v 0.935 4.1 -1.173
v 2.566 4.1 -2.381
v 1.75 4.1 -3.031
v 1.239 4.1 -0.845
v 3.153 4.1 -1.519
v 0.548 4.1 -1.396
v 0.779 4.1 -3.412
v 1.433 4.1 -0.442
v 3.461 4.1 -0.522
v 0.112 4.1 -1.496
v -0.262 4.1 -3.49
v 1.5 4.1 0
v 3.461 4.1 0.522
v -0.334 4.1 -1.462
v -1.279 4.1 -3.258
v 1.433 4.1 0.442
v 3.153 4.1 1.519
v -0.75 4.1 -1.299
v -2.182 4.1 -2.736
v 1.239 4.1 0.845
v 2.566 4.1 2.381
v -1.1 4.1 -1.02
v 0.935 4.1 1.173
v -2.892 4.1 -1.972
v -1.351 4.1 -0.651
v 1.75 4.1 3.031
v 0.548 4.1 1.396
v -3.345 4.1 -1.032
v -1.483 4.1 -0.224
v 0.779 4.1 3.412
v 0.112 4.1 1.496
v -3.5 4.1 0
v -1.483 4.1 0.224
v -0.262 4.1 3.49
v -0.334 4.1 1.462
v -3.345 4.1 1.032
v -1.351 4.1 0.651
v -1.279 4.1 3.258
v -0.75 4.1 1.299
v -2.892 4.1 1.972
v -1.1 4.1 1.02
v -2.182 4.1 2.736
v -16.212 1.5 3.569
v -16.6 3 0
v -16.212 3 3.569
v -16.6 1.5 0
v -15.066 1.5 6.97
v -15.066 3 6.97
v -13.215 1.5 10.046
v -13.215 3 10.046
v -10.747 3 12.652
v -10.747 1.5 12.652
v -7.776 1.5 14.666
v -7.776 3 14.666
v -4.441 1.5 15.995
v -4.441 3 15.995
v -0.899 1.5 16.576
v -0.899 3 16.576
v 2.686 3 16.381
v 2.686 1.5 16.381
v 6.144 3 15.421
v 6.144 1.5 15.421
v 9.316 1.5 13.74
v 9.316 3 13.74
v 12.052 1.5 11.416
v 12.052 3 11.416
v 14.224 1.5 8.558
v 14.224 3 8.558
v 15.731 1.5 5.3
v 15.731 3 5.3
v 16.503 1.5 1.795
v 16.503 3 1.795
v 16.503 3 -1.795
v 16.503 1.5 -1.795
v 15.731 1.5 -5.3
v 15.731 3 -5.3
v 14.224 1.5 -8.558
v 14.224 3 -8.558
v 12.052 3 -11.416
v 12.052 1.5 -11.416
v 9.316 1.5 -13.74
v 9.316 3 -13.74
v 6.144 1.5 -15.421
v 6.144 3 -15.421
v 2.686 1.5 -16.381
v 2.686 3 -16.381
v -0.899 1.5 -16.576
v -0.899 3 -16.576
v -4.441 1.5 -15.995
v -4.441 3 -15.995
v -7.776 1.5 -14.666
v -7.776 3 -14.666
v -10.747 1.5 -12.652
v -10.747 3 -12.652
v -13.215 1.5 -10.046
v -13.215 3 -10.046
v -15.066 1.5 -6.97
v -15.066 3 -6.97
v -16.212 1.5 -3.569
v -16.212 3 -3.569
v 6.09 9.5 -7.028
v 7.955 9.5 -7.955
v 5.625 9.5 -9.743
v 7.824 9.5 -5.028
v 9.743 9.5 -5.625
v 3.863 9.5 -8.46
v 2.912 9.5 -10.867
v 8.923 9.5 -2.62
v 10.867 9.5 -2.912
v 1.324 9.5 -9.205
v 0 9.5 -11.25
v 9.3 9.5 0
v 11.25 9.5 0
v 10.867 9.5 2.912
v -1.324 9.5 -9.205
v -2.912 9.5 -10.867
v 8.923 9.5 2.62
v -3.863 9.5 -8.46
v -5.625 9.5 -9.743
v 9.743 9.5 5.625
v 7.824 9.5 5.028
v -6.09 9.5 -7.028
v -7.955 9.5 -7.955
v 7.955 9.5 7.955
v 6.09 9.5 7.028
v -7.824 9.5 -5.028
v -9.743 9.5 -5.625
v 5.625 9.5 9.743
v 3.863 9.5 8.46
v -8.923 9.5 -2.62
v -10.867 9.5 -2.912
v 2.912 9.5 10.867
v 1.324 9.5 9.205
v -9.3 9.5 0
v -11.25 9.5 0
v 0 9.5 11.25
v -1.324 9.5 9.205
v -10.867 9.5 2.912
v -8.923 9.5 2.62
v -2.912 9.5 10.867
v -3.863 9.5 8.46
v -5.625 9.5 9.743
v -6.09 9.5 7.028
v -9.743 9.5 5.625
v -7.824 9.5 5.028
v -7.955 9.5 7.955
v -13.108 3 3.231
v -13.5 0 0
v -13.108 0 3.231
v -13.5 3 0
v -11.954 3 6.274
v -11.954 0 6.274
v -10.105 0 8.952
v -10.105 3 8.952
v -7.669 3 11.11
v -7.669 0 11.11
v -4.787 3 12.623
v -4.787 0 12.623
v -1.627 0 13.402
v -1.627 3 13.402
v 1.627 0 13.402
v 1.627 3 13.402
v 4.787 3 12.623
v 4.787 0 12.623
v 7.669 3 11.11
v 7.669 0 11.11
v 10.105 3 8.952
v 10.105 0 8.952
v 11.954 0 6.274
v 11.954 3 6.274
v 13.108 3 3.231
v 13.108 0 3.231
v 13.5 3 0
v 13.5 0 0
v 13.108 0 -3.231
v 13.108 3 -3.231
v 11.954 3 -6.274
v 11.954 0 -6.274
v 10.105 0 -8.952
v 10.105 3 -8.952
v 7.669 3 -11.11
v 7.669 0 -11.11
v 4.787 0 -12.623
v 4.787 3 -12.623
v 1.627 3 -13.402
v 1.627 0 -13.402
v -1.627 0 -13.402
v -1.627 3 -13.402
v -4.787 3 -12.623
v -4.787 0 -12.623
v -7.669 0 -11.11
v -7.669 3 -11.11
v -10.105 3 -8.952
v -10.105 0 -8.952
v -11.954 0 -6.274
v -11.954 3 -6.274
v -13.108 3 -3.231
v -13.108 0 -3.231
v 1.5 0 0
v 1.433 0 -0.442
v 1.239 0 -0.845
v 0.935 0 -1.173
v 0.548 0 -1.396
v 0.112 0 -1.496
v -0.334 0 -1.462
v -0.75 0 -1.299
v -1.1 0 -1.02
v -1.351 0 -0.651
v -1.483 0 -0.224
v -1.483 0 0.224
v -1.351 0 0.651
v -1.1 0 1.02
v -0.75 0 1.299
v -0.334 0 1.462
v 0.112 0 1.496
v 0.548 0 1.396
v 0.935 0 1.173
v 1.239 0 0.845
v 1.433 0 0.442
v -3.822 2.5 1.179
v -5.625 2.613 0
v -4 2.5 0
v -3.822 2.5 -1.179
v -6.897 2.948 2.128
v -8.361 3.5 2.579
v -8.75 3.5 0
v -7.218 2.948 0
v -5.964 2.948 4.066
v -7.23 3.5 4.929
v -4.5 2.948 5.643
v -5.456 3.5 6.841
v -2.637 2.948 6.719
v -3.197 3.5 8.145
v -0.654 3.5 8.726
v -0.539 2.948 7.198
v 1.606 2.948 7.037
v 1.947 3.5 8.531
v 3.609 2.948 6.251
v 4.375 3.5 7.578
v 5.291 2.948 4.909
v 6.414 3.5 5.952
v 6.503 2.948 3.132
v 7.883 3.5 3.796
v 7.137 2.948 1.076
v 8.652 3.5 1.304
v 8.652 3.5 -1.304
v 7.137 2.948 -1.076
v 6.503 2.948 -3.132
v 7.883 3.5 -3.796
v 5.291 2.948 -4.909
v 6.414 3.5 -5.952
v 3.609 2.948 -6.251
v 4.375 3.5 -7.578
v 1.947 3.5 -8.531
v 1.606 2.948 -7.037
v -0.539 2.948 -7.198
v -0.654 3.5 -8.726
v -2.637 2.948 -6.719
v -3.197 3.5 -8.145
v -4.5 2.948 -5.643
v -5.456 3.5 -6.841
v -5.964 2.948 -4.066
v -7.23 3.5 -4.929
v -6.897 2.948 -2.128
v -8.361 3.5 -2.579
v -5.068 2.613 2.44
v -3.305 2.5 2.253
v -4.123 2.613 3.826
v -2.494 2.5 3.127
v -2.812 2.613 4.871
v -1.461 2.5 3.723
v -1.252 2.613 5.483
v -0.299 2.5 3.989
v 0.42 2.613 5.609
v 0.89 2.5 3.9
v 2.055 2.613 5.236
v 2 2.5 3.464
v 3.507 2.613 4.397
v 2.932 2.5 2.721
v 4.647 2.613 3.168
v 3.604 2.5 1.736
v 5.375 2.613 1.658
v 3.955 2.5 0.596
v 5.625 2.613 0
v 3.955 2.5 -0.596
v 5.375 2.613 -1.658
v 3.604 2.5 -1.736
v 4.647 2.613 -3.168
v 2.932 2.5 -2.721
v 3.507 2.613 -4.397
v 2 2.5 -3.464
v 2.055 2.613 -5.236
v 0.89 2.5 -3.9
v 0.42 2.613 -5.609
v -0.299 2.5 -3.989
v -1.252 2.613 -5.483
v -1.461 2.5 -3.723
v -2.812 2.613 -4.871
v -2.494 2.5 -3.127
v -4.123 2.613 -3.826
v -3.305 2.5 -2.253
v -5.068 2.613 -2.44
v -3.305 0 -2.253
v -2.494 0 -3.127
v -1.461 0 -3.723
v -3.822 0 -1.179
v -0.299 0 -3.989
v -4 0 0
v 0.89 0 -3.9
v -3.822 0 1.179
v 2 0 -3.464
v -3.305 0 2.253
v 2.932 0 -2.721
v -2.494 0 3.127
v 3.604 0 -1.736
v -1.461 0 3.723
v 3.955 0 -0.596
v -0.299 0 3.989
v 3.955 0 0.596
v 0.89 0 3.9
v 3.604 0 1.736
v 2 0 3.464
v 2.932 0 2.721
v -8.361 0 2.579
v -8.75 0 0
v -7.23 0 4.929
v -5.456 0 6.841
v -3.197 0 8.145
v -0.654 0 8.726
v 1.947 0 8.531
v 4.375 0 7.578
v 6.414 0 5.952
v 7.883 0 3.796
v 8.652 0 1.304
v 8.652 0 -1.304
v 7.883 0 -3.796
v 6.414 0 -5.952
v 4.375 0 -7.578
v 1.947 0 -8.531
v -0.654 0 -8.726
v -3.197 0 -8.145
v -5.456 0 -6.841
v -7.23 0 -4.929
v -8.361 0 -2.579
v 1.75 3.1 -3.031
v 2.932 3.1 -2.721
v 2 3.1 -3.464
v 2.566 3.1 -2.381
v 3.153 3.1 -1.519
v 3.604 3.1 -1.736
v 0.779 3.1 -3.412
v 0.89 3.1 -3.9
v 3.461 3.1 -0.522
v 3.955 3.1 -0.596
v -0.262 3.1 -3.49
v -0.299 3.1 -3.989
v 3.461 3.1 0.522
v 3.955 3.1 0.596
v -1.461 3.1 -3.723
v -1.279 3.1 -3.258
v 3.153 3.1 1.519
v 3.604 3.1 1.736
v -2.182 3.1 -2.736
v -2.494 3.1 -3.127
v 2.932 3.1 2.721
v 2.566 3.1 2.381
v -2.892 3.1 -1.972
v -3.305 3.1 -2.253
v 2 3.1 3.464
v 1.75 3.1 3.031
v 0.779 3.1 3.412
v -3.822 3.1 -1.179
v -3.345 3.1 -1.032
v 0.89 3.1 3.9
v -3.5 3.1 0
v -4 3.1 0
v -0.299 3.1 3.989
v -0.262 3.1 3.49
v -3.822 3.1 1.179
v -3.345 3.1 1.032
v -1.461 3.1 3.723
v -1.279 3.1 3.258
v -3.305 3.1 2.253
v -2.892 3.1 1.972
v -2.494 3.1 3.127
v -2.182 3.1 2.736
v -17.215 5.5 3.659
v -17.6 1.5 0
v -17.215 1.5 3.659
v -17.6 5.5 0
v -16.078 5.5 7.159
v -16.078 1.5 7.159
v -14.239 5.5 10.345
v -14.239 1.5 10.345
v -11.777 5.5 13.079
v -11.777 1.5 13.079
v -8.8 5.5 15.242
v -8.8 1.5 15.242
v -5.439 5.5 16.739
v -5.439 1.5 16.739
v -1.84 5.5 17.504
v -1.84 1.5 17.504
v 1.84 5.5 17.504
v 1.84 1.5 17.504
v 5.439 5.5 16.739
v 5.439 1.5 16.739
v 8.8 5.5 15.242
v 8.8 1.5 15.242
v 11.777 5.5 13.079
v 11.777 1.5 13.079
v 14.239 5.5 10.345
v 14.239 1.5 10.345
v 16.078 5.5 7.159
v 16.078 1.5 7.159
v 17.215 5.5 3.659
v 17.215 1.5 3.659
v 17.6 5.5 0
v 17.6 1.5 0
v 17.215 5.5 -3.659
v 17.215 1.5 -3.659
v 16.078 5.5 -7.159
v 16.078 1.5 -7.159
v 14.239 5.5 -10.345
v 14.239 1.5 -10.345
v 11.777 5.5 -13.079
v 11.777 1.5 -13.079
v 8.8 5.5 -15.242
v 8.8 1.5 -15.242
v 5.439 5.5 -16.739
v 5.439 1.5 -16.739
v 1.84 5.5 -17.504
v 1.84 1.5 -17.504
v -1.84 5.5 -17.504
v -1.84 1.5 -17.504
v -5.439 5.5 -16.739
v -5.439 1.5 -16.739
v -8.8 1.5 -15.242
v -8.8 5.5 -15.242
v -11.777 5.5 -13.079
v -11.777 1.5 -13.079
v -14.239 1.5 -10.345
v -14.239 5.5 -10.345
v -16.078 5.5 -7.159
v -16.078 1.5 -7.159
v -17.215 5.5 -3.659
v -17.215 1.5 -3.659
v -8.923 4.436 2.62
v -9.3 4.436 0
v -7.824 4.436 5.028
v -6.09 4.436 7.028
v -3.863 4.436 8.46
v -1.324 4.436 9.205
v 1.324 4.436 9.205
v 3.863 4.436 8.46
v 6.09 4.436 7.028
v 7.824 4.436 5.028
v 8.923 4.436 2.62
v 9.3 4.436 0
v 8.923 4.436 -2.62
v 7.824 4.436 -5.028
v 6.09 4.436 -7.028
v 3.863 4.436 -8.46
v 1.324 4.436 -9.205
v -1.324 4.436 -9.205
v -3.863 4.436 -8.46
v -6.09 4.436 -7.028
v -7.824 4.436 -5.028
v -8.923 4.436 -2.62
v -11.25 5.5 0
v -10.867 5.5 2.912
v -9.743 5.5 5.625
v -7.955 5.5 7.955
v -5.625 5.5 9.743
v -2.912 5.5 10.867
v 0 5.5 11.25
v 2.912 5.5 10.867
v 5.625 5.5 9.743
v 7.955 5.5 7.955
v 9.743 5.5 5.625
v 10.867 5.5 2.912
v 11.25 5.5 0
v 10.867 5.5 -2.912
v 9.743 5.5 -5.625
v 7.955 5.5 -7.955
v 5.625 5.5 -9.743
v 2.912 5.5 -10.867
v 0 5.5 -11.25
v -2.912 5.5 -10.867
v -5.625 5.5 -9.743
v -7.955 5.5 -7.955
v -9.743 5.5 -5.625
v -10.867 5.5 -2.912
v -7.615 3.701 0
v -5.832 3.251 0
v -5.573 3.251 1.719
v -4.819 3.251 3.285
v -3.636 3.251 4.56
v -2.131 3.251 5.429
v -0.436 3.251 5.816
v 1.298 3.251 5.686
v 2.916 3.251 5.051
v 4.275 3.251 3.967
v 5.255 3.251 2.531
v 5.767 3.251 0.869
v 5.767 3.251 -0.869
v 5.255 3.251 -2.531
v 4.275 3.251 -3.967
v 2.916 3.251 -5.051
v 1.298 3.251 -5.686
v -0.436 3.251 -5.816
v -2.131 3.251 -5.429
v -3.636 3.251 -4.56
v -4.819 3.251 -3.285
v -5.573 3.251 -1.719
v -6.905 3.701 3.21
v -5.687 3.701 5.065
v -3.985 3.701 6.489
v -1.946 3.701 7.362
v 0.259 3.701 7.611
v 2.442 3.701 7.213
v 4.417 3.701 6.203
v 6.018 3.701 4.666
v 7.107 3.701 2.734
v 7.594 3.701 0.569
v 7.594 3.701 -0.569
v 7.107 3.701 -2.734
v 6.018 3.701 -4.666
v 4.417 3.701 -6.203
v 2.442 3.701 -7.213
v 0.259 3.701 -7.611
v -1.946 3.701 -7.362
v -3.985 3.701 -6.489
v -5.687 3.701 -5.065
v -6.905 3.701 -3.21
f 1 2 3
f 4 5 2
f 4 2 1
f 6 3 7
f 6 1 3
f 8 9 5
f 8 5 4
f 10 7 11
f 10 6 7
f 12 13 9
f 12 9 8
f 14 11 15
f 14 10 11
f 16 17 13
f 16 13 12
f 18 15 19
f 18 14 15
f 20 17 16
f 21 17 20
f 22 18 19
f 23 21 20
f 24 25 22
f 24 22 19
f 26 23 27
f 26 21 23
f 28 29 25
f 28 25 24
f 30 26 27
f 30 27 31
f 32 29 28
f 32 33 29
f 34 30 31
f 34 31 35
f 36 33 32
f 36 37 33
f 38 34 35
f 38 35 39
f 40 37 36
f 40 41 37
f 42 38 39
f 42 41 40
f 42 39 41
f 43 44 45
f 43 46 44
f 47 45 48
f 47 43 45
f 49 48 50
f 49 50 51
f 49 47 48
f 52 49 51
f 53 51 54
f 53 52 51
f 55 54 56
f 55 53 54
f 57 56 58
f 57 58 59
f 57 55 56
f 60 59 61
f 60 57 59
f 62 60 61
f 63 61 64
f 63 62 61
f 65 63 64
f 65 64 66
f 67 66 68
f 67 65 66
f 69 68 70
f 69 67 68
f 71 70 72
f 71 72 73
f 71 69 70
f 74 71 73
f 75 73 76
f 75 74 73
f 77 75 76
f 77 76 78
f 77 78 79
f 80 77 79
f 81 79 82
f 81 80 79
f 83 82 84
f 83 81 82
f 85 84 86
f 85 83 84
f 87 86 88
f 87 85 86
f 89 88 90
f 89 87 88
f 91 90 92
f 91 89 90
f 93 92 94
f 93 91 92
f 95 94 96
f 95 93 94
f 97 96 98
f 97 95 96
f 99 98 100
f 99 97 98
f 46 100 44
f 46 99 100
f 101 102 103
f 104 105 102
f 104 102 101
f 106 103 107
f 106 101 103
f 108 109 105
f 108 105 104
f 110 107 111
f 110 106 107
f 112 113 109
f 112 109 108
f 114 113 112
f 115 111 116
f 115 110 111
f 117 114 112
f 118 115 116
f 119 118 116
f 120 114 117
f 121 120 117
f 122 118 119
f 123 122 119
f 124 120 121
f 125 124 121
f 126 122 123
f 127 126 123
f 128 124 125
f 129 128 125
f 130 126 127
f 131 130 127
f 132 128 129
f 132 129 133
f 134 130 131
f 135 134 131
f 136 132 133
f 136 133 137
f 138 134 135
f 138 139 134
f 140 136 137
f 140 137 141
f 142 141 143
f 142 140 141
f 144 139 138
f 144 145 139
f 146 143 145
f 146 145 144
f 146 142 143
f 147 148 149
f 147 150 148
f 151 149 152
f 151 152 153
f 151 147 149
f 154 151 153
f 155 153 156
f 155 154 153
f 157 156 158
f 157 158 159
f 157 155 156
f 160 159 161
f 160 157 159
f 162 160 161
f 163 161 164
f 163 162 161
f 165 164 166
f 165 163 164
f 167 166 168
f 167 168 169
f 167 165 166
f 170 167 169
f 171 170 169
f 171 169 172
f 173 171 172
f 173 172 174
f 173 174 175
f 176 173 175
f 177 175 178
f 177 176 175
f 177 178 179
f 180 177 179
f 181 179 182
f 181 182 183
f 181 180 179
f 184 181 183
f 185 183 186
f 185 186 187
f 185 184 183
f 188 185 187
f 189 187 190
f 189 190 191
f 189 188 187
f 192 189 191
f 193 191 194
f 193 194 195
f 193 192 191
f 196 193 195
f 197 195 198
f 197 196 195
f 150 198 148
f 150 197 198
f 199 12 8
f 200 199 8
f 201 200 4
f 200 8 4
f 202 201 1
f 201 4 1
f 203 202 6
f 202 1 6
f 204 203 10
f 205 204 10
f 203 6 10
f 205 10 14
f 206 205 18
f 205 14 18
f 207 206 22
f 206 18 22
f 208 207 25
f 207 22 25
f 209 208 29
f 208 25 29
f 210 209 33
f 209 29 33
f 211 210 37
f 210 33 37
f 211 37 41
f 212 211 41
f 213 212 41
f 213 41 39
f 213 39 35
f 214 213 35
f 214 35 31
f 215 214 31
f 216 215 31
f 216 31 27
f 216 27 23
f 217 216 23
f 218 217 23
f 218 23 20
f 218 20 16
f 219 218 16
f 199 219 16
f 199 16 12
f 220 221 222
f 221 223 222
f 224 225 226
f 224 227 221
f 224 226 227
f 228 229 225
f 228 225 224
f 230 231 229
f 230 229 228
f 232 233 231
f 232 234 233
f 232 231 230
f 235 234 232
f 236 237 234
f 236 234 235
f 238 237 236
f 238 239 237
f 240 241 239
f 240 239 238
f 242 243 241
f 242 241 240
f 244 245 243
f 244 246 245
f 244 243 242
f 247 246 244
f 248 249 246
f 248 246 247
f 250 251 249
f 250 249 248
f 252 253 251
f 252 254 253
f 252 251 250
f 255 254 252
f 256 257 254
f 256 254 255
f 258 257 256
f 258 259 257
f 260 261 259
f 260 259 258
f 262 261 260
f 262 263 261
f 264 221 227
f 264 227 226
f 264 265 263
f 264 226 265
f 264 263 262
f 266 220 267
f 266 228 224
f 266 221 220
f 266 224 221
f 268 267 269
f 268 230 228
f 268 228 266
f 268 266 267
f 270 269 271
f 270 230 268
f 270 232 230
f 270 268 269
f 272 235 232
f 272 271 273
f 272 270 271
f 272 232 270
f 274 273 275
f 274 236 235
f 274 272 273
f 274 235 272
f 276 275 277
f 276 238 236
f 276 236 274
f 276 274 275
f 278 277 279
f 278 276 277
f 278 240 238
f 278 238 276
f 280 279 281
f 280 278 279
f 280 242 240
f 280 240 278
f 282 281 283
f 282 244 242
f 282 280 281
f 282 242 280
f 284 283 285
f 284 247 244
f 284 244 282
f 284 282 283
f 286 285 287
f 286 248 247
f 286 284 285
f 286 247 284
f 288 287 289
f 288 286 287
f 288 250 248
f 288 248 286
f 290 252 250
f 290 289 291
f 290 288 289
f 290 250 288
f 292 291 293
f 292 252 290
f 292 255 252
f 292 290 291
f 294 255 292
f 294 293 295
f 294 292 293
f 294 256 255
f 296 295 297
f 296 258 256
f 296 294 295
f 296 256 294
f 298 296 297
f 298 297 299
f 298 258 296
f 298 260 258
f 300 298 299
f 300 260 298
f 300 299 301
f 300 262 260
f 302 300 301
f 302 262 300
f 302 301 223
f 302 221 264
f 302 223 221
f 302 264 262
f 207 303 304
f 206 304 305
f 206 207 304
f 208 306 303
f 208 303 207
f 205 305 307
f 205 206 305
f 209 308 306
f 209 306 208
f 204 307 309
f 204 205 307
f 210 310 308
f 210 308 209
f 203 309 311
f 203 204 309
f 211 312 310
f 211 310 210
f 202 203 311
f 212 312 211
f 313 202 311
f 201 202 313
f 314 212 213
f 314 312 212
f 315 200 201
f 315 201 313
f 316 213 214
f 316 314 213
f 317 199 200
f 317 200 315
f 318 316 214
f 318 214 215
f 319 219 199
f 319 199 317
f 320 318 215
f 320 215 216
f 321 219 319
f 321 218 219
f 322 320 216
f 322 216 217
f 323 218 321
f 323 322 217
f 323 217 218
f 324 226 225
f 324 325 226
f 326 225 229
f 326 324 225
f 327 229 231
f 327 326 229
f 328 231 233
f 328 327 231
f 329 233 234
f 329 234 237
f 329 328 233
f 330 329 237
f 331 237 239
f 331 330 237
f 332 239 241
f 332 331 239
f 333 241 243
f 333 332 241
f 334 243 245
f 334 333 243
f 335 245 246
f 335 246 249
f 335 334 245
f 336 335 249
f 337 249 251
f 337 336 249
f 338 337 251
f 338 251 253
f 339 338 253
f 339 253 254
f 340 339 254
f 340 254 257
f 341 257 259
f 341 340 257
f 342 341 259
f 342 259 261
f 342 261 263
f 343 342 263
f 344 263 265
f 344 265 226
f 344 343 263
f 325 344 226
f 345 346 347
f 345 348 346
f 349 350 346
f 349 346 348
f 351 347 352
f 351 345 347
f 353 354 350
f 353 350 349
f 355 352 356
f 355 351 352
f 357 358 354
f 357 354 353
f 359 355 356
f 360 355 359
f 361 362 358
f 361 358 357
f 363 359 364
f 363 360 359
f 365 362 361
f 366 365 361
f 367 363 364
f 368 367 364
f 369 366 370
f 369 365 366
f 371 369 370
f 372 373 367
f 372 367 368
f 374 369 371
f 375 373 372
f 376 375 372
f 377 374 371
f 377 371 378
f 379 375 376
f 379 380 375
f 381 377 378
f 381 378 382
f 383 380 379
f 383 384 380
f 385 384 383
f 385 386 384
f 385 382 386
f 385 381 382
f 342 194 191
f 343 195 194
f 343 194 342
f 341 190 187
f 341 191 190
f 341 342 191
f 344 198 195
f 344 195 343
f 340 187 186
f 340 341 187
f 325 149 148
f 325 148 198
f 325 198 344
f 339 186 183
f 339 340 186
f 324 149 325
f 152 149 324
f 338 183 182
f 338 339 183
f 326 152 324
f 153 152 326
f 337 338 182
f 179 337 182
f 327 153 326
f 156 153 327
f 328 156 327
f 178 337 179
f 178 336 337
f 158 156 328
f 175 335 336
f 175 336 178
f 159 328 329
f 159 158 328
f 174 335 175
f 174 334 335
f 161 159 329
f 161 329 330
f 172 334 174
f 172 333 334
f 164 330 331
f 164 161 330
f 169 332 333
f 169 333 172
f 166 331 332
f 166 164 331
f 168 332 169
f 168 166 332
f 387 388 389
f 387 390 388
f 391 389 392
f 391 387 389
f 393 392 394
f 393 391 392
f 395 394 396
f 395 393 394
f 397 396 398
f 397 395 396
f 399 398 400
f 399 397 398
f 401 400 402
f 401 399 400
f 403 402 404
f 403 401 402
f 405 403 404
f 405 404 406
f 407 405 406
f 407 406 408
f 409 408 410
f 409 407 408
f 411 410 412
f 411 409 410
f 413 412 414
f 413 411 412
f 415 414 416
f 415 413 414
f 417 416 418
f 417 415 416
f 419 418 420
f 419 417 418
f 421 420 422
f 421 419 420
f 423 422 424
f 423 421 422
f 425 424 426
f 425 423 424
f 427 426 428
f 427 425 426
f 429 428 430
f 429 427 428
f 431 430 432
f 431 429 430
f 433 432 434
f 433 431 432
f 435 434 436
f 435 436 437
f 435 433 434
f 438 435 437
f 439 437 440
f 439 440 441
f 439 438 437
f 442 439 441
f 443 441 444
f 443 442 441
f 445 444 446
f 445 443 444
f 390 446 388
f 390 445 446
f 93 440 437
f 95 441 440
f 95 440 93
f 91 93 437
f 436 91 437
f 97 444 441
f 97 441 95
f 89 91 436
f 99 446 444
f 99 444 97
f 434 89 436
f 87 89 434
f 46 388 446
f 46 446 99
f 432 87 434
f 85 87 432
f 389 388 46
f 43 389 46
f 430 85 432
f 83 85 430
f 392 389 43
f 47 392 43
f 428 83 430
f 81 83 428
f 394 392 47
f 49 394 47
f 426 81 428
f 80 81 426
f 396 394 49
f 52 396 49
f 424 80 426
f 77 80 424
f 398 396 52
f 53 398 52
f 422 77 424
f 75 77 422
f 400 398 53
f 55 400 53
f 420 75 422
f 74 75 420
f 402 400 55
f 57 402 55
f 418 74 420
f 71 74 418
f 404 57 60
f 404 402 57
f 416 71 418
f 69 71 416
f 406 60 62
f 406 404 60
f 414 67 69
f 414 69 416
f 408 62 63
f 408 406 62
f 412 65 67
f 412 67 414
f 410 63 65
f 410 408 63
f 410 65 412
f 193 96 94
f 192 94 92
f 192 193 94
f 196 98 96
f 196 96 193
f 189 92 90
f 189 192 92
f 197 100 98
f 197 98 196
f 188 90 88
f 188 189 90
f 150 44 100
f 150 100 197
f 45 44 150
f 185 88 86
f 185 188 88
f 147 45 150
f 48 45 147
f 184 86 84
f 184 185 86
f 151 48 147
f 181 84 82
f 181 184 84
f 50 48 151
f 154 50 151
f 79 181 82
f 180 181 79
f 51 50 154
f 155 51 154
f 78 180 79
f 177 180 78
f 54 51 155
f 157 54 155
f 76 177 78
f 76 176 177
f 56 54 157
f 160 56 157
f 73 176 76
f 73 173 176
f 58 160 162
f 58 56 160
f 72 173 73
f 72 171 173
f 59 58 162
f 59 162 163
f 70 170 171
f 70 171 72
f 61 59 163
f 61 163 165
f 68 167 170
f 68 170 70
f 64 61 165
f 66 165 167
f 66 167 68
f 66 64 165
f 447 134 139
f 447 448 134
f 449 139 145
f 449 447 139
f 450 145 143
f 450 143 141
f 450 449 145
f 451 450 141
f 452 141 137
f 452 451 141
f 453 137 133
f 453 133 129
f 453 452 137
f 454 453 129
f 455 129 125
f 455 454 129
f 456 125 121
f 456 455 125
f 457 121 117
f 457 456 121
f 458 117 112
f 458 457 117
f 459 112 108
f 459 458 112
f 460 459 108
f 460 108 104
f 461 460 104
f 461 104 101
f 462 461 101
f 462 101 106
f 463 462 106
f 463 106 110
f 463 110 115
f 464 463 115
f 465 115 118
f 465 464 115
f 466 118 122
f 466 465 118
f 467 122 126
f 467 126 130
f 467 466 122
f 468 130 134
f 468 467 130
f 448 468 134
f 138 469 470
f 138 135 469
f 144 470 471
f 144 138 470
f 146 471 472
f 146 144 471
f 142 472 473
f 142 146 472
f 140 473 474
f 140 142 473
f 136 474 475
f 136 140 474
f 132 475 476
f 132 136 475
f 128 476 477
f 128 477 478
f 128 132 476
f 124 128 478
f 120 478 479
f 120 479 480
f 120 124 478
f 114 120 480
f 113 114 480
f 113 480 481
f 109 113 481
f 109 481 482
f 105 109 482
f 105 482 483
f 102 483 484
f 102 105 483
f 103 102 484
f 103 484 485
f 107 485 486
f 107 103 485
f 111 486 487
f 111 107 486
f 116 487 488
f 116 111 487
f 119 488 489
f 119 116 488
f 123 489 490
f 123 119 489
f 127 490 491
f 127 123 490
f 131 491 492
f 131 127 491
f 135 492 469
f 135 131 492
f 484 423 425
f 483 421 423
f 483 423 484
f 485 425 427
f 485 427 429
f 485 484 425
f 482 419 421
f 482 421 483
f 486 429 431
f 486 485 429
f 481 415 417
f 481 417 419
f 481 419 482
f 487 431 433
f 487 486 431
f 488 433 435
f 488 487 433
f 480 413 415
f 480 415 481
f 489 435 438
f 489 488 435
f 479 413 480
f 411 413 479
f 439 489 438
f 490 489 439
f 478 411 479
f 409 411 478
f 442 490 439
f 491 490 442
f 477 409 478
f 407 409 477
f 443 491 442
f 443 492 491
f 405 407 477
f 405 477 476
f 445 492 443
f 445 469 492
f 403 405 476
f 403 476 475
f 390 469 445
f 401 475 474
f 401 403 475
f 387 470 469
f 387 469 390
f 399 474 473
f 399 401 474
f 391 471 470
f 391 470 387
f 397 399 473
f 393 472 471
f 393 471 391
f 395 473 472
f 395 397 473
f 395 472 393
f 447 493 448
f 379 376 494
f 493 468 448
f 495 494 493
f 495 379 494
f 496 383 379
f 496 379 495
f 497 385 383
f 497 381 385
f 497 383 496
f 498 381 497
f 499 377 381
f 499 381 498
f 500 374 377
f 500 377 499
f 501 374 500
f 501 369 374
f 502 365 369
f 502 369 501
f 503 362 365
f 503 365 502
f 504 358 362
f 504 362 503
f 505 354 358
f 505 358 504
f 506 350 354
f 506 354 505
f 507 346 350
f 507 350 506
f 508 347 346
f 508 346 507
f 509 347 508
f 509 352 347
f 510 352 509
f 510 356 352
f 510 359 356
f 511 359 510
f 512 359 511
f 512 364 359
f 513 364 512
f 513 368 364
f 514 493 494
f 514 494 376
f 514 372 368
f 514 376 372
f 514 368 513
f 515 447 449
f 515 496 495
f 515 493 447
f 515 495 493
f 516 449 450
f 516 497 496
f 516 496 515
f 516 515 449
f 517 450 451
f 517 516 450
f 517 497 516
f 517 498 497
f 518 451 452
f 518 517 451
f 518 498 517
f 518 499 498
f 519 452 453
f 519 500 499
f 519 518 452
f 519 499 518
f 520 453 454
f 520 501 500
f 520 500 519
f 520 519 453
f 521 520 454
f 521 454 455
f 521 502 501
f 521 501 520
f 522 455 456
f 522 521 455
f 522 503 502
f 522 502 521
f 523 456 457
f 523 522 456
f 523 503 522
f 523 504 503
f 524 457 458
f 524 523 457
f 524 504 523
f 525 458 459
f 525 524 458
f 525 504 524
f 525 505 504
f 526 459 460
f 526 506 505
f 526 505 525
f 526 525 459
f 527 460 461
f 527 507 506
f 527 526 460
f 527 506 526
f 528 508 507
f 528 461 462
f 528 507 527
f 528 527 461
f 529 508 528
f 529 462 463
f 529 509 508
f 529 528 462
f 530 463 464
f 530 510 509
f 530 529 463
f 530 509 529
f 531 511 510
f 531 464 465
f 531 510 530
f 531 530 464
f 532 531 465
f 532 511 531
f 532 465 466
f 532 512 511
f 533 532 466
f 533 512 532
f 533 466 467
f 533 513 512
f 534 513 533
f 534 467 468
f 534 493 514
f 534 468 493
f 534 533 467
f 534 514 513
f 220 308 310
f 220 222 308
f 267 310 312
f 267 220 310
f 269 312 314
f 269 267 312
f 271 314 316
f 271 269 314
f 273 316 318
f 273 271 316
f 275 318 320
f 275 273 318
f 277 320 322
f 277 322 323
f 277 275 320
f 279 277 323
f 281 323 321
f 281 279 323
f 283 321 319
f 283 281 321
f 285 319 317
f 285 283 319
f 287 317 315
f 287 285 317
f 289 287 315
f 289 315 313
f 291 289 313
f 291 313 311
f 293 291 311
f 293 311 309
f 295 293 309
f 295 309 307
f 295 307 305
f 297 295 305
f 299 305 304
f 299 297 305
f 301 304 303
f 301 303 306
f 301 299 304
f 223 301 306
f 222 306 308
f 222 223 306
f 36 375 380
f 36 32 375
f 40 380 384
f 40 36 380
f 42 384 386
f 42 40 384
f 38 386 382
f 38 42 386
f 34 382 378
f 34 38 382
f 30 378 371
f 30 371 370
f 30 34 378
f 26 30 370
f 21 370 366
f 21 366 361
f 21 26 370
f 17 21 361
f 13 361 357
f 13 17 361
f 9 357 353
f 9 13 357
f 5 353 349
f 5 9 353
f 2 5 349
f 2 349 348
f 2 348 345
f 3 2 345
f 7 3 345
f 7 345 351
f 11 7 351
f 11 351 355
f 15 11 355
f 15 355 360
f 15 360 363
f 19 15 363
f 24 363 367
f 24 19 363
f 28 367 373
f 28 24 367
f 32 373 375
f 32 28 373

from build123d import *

# Parameters (mm, degrees)
SKETCH2_R          = 1.5
CUT_EXTRUDE1_DEPTH = 10


with BuildPart() as part:
    # Sketch1 → Revolve1 (revolve)
    with BuildSketch(Plane.XY):
        with BuildLine():
            Line((-17.6, 1.5), (-17.6, 5.5))
            Line((-17.6, 5.5), (-11.25, 5.5))
            Line((-11.25, 5.5), (-11.25, 9.5))
            Line((-11.25, 9.5), (-9.3, 9.5))
            Line((-9.3, 9.5), (-9.3, 4.435928697))
            ThreePointArc((-9.3, 4.435928697), (-6.732887918, 3.439124969), (-4, 3.1))
            Line((-4, 3.1), (-3.5, 3.1))
            Line((-3.5, 3.1), (-3.5, 4.1))
            Line((-3.5, 4.1), (0, 4.1))
            Line((0, 4.1), (0, 0))
            Line((0, 0), (-4, 0))
            Line((-4, 0), (-4, 2.5))
            ThreePointArc((-4, 2.5), (-6.42706098, 2.752710346), (-8.75, 3.5))
            Line((-8.75, 3.5), (-8.75, 0))
            Line((-8.75, 0), (-13.5, 0))
            Line((-13.5, 0), (-13.5, 3))
            Line((-13.5, 3), (-16.6, 3))
            Line((-16.6, 3), (-16.6, 1.5))
            Line((-16.6, 1.5), (-17.6, 1.5))
        make_face()
    revolve(axis=Axis((0, 0, 0), (0, 1, 0)))

    # Sketch2 → Cut-Extrude1 (cut)
    with BuildSketch(Plane(origin=(0, 4.1, 0), x_dir=(1, 0, 0), z_dir=(0, 1, 0))):
        Circle(SKETCH2_R)
    extrude(amount=-CUT_EXTRUDE1_DEPTH, mode=Mode.SUBTRACT)


solid = part.part
